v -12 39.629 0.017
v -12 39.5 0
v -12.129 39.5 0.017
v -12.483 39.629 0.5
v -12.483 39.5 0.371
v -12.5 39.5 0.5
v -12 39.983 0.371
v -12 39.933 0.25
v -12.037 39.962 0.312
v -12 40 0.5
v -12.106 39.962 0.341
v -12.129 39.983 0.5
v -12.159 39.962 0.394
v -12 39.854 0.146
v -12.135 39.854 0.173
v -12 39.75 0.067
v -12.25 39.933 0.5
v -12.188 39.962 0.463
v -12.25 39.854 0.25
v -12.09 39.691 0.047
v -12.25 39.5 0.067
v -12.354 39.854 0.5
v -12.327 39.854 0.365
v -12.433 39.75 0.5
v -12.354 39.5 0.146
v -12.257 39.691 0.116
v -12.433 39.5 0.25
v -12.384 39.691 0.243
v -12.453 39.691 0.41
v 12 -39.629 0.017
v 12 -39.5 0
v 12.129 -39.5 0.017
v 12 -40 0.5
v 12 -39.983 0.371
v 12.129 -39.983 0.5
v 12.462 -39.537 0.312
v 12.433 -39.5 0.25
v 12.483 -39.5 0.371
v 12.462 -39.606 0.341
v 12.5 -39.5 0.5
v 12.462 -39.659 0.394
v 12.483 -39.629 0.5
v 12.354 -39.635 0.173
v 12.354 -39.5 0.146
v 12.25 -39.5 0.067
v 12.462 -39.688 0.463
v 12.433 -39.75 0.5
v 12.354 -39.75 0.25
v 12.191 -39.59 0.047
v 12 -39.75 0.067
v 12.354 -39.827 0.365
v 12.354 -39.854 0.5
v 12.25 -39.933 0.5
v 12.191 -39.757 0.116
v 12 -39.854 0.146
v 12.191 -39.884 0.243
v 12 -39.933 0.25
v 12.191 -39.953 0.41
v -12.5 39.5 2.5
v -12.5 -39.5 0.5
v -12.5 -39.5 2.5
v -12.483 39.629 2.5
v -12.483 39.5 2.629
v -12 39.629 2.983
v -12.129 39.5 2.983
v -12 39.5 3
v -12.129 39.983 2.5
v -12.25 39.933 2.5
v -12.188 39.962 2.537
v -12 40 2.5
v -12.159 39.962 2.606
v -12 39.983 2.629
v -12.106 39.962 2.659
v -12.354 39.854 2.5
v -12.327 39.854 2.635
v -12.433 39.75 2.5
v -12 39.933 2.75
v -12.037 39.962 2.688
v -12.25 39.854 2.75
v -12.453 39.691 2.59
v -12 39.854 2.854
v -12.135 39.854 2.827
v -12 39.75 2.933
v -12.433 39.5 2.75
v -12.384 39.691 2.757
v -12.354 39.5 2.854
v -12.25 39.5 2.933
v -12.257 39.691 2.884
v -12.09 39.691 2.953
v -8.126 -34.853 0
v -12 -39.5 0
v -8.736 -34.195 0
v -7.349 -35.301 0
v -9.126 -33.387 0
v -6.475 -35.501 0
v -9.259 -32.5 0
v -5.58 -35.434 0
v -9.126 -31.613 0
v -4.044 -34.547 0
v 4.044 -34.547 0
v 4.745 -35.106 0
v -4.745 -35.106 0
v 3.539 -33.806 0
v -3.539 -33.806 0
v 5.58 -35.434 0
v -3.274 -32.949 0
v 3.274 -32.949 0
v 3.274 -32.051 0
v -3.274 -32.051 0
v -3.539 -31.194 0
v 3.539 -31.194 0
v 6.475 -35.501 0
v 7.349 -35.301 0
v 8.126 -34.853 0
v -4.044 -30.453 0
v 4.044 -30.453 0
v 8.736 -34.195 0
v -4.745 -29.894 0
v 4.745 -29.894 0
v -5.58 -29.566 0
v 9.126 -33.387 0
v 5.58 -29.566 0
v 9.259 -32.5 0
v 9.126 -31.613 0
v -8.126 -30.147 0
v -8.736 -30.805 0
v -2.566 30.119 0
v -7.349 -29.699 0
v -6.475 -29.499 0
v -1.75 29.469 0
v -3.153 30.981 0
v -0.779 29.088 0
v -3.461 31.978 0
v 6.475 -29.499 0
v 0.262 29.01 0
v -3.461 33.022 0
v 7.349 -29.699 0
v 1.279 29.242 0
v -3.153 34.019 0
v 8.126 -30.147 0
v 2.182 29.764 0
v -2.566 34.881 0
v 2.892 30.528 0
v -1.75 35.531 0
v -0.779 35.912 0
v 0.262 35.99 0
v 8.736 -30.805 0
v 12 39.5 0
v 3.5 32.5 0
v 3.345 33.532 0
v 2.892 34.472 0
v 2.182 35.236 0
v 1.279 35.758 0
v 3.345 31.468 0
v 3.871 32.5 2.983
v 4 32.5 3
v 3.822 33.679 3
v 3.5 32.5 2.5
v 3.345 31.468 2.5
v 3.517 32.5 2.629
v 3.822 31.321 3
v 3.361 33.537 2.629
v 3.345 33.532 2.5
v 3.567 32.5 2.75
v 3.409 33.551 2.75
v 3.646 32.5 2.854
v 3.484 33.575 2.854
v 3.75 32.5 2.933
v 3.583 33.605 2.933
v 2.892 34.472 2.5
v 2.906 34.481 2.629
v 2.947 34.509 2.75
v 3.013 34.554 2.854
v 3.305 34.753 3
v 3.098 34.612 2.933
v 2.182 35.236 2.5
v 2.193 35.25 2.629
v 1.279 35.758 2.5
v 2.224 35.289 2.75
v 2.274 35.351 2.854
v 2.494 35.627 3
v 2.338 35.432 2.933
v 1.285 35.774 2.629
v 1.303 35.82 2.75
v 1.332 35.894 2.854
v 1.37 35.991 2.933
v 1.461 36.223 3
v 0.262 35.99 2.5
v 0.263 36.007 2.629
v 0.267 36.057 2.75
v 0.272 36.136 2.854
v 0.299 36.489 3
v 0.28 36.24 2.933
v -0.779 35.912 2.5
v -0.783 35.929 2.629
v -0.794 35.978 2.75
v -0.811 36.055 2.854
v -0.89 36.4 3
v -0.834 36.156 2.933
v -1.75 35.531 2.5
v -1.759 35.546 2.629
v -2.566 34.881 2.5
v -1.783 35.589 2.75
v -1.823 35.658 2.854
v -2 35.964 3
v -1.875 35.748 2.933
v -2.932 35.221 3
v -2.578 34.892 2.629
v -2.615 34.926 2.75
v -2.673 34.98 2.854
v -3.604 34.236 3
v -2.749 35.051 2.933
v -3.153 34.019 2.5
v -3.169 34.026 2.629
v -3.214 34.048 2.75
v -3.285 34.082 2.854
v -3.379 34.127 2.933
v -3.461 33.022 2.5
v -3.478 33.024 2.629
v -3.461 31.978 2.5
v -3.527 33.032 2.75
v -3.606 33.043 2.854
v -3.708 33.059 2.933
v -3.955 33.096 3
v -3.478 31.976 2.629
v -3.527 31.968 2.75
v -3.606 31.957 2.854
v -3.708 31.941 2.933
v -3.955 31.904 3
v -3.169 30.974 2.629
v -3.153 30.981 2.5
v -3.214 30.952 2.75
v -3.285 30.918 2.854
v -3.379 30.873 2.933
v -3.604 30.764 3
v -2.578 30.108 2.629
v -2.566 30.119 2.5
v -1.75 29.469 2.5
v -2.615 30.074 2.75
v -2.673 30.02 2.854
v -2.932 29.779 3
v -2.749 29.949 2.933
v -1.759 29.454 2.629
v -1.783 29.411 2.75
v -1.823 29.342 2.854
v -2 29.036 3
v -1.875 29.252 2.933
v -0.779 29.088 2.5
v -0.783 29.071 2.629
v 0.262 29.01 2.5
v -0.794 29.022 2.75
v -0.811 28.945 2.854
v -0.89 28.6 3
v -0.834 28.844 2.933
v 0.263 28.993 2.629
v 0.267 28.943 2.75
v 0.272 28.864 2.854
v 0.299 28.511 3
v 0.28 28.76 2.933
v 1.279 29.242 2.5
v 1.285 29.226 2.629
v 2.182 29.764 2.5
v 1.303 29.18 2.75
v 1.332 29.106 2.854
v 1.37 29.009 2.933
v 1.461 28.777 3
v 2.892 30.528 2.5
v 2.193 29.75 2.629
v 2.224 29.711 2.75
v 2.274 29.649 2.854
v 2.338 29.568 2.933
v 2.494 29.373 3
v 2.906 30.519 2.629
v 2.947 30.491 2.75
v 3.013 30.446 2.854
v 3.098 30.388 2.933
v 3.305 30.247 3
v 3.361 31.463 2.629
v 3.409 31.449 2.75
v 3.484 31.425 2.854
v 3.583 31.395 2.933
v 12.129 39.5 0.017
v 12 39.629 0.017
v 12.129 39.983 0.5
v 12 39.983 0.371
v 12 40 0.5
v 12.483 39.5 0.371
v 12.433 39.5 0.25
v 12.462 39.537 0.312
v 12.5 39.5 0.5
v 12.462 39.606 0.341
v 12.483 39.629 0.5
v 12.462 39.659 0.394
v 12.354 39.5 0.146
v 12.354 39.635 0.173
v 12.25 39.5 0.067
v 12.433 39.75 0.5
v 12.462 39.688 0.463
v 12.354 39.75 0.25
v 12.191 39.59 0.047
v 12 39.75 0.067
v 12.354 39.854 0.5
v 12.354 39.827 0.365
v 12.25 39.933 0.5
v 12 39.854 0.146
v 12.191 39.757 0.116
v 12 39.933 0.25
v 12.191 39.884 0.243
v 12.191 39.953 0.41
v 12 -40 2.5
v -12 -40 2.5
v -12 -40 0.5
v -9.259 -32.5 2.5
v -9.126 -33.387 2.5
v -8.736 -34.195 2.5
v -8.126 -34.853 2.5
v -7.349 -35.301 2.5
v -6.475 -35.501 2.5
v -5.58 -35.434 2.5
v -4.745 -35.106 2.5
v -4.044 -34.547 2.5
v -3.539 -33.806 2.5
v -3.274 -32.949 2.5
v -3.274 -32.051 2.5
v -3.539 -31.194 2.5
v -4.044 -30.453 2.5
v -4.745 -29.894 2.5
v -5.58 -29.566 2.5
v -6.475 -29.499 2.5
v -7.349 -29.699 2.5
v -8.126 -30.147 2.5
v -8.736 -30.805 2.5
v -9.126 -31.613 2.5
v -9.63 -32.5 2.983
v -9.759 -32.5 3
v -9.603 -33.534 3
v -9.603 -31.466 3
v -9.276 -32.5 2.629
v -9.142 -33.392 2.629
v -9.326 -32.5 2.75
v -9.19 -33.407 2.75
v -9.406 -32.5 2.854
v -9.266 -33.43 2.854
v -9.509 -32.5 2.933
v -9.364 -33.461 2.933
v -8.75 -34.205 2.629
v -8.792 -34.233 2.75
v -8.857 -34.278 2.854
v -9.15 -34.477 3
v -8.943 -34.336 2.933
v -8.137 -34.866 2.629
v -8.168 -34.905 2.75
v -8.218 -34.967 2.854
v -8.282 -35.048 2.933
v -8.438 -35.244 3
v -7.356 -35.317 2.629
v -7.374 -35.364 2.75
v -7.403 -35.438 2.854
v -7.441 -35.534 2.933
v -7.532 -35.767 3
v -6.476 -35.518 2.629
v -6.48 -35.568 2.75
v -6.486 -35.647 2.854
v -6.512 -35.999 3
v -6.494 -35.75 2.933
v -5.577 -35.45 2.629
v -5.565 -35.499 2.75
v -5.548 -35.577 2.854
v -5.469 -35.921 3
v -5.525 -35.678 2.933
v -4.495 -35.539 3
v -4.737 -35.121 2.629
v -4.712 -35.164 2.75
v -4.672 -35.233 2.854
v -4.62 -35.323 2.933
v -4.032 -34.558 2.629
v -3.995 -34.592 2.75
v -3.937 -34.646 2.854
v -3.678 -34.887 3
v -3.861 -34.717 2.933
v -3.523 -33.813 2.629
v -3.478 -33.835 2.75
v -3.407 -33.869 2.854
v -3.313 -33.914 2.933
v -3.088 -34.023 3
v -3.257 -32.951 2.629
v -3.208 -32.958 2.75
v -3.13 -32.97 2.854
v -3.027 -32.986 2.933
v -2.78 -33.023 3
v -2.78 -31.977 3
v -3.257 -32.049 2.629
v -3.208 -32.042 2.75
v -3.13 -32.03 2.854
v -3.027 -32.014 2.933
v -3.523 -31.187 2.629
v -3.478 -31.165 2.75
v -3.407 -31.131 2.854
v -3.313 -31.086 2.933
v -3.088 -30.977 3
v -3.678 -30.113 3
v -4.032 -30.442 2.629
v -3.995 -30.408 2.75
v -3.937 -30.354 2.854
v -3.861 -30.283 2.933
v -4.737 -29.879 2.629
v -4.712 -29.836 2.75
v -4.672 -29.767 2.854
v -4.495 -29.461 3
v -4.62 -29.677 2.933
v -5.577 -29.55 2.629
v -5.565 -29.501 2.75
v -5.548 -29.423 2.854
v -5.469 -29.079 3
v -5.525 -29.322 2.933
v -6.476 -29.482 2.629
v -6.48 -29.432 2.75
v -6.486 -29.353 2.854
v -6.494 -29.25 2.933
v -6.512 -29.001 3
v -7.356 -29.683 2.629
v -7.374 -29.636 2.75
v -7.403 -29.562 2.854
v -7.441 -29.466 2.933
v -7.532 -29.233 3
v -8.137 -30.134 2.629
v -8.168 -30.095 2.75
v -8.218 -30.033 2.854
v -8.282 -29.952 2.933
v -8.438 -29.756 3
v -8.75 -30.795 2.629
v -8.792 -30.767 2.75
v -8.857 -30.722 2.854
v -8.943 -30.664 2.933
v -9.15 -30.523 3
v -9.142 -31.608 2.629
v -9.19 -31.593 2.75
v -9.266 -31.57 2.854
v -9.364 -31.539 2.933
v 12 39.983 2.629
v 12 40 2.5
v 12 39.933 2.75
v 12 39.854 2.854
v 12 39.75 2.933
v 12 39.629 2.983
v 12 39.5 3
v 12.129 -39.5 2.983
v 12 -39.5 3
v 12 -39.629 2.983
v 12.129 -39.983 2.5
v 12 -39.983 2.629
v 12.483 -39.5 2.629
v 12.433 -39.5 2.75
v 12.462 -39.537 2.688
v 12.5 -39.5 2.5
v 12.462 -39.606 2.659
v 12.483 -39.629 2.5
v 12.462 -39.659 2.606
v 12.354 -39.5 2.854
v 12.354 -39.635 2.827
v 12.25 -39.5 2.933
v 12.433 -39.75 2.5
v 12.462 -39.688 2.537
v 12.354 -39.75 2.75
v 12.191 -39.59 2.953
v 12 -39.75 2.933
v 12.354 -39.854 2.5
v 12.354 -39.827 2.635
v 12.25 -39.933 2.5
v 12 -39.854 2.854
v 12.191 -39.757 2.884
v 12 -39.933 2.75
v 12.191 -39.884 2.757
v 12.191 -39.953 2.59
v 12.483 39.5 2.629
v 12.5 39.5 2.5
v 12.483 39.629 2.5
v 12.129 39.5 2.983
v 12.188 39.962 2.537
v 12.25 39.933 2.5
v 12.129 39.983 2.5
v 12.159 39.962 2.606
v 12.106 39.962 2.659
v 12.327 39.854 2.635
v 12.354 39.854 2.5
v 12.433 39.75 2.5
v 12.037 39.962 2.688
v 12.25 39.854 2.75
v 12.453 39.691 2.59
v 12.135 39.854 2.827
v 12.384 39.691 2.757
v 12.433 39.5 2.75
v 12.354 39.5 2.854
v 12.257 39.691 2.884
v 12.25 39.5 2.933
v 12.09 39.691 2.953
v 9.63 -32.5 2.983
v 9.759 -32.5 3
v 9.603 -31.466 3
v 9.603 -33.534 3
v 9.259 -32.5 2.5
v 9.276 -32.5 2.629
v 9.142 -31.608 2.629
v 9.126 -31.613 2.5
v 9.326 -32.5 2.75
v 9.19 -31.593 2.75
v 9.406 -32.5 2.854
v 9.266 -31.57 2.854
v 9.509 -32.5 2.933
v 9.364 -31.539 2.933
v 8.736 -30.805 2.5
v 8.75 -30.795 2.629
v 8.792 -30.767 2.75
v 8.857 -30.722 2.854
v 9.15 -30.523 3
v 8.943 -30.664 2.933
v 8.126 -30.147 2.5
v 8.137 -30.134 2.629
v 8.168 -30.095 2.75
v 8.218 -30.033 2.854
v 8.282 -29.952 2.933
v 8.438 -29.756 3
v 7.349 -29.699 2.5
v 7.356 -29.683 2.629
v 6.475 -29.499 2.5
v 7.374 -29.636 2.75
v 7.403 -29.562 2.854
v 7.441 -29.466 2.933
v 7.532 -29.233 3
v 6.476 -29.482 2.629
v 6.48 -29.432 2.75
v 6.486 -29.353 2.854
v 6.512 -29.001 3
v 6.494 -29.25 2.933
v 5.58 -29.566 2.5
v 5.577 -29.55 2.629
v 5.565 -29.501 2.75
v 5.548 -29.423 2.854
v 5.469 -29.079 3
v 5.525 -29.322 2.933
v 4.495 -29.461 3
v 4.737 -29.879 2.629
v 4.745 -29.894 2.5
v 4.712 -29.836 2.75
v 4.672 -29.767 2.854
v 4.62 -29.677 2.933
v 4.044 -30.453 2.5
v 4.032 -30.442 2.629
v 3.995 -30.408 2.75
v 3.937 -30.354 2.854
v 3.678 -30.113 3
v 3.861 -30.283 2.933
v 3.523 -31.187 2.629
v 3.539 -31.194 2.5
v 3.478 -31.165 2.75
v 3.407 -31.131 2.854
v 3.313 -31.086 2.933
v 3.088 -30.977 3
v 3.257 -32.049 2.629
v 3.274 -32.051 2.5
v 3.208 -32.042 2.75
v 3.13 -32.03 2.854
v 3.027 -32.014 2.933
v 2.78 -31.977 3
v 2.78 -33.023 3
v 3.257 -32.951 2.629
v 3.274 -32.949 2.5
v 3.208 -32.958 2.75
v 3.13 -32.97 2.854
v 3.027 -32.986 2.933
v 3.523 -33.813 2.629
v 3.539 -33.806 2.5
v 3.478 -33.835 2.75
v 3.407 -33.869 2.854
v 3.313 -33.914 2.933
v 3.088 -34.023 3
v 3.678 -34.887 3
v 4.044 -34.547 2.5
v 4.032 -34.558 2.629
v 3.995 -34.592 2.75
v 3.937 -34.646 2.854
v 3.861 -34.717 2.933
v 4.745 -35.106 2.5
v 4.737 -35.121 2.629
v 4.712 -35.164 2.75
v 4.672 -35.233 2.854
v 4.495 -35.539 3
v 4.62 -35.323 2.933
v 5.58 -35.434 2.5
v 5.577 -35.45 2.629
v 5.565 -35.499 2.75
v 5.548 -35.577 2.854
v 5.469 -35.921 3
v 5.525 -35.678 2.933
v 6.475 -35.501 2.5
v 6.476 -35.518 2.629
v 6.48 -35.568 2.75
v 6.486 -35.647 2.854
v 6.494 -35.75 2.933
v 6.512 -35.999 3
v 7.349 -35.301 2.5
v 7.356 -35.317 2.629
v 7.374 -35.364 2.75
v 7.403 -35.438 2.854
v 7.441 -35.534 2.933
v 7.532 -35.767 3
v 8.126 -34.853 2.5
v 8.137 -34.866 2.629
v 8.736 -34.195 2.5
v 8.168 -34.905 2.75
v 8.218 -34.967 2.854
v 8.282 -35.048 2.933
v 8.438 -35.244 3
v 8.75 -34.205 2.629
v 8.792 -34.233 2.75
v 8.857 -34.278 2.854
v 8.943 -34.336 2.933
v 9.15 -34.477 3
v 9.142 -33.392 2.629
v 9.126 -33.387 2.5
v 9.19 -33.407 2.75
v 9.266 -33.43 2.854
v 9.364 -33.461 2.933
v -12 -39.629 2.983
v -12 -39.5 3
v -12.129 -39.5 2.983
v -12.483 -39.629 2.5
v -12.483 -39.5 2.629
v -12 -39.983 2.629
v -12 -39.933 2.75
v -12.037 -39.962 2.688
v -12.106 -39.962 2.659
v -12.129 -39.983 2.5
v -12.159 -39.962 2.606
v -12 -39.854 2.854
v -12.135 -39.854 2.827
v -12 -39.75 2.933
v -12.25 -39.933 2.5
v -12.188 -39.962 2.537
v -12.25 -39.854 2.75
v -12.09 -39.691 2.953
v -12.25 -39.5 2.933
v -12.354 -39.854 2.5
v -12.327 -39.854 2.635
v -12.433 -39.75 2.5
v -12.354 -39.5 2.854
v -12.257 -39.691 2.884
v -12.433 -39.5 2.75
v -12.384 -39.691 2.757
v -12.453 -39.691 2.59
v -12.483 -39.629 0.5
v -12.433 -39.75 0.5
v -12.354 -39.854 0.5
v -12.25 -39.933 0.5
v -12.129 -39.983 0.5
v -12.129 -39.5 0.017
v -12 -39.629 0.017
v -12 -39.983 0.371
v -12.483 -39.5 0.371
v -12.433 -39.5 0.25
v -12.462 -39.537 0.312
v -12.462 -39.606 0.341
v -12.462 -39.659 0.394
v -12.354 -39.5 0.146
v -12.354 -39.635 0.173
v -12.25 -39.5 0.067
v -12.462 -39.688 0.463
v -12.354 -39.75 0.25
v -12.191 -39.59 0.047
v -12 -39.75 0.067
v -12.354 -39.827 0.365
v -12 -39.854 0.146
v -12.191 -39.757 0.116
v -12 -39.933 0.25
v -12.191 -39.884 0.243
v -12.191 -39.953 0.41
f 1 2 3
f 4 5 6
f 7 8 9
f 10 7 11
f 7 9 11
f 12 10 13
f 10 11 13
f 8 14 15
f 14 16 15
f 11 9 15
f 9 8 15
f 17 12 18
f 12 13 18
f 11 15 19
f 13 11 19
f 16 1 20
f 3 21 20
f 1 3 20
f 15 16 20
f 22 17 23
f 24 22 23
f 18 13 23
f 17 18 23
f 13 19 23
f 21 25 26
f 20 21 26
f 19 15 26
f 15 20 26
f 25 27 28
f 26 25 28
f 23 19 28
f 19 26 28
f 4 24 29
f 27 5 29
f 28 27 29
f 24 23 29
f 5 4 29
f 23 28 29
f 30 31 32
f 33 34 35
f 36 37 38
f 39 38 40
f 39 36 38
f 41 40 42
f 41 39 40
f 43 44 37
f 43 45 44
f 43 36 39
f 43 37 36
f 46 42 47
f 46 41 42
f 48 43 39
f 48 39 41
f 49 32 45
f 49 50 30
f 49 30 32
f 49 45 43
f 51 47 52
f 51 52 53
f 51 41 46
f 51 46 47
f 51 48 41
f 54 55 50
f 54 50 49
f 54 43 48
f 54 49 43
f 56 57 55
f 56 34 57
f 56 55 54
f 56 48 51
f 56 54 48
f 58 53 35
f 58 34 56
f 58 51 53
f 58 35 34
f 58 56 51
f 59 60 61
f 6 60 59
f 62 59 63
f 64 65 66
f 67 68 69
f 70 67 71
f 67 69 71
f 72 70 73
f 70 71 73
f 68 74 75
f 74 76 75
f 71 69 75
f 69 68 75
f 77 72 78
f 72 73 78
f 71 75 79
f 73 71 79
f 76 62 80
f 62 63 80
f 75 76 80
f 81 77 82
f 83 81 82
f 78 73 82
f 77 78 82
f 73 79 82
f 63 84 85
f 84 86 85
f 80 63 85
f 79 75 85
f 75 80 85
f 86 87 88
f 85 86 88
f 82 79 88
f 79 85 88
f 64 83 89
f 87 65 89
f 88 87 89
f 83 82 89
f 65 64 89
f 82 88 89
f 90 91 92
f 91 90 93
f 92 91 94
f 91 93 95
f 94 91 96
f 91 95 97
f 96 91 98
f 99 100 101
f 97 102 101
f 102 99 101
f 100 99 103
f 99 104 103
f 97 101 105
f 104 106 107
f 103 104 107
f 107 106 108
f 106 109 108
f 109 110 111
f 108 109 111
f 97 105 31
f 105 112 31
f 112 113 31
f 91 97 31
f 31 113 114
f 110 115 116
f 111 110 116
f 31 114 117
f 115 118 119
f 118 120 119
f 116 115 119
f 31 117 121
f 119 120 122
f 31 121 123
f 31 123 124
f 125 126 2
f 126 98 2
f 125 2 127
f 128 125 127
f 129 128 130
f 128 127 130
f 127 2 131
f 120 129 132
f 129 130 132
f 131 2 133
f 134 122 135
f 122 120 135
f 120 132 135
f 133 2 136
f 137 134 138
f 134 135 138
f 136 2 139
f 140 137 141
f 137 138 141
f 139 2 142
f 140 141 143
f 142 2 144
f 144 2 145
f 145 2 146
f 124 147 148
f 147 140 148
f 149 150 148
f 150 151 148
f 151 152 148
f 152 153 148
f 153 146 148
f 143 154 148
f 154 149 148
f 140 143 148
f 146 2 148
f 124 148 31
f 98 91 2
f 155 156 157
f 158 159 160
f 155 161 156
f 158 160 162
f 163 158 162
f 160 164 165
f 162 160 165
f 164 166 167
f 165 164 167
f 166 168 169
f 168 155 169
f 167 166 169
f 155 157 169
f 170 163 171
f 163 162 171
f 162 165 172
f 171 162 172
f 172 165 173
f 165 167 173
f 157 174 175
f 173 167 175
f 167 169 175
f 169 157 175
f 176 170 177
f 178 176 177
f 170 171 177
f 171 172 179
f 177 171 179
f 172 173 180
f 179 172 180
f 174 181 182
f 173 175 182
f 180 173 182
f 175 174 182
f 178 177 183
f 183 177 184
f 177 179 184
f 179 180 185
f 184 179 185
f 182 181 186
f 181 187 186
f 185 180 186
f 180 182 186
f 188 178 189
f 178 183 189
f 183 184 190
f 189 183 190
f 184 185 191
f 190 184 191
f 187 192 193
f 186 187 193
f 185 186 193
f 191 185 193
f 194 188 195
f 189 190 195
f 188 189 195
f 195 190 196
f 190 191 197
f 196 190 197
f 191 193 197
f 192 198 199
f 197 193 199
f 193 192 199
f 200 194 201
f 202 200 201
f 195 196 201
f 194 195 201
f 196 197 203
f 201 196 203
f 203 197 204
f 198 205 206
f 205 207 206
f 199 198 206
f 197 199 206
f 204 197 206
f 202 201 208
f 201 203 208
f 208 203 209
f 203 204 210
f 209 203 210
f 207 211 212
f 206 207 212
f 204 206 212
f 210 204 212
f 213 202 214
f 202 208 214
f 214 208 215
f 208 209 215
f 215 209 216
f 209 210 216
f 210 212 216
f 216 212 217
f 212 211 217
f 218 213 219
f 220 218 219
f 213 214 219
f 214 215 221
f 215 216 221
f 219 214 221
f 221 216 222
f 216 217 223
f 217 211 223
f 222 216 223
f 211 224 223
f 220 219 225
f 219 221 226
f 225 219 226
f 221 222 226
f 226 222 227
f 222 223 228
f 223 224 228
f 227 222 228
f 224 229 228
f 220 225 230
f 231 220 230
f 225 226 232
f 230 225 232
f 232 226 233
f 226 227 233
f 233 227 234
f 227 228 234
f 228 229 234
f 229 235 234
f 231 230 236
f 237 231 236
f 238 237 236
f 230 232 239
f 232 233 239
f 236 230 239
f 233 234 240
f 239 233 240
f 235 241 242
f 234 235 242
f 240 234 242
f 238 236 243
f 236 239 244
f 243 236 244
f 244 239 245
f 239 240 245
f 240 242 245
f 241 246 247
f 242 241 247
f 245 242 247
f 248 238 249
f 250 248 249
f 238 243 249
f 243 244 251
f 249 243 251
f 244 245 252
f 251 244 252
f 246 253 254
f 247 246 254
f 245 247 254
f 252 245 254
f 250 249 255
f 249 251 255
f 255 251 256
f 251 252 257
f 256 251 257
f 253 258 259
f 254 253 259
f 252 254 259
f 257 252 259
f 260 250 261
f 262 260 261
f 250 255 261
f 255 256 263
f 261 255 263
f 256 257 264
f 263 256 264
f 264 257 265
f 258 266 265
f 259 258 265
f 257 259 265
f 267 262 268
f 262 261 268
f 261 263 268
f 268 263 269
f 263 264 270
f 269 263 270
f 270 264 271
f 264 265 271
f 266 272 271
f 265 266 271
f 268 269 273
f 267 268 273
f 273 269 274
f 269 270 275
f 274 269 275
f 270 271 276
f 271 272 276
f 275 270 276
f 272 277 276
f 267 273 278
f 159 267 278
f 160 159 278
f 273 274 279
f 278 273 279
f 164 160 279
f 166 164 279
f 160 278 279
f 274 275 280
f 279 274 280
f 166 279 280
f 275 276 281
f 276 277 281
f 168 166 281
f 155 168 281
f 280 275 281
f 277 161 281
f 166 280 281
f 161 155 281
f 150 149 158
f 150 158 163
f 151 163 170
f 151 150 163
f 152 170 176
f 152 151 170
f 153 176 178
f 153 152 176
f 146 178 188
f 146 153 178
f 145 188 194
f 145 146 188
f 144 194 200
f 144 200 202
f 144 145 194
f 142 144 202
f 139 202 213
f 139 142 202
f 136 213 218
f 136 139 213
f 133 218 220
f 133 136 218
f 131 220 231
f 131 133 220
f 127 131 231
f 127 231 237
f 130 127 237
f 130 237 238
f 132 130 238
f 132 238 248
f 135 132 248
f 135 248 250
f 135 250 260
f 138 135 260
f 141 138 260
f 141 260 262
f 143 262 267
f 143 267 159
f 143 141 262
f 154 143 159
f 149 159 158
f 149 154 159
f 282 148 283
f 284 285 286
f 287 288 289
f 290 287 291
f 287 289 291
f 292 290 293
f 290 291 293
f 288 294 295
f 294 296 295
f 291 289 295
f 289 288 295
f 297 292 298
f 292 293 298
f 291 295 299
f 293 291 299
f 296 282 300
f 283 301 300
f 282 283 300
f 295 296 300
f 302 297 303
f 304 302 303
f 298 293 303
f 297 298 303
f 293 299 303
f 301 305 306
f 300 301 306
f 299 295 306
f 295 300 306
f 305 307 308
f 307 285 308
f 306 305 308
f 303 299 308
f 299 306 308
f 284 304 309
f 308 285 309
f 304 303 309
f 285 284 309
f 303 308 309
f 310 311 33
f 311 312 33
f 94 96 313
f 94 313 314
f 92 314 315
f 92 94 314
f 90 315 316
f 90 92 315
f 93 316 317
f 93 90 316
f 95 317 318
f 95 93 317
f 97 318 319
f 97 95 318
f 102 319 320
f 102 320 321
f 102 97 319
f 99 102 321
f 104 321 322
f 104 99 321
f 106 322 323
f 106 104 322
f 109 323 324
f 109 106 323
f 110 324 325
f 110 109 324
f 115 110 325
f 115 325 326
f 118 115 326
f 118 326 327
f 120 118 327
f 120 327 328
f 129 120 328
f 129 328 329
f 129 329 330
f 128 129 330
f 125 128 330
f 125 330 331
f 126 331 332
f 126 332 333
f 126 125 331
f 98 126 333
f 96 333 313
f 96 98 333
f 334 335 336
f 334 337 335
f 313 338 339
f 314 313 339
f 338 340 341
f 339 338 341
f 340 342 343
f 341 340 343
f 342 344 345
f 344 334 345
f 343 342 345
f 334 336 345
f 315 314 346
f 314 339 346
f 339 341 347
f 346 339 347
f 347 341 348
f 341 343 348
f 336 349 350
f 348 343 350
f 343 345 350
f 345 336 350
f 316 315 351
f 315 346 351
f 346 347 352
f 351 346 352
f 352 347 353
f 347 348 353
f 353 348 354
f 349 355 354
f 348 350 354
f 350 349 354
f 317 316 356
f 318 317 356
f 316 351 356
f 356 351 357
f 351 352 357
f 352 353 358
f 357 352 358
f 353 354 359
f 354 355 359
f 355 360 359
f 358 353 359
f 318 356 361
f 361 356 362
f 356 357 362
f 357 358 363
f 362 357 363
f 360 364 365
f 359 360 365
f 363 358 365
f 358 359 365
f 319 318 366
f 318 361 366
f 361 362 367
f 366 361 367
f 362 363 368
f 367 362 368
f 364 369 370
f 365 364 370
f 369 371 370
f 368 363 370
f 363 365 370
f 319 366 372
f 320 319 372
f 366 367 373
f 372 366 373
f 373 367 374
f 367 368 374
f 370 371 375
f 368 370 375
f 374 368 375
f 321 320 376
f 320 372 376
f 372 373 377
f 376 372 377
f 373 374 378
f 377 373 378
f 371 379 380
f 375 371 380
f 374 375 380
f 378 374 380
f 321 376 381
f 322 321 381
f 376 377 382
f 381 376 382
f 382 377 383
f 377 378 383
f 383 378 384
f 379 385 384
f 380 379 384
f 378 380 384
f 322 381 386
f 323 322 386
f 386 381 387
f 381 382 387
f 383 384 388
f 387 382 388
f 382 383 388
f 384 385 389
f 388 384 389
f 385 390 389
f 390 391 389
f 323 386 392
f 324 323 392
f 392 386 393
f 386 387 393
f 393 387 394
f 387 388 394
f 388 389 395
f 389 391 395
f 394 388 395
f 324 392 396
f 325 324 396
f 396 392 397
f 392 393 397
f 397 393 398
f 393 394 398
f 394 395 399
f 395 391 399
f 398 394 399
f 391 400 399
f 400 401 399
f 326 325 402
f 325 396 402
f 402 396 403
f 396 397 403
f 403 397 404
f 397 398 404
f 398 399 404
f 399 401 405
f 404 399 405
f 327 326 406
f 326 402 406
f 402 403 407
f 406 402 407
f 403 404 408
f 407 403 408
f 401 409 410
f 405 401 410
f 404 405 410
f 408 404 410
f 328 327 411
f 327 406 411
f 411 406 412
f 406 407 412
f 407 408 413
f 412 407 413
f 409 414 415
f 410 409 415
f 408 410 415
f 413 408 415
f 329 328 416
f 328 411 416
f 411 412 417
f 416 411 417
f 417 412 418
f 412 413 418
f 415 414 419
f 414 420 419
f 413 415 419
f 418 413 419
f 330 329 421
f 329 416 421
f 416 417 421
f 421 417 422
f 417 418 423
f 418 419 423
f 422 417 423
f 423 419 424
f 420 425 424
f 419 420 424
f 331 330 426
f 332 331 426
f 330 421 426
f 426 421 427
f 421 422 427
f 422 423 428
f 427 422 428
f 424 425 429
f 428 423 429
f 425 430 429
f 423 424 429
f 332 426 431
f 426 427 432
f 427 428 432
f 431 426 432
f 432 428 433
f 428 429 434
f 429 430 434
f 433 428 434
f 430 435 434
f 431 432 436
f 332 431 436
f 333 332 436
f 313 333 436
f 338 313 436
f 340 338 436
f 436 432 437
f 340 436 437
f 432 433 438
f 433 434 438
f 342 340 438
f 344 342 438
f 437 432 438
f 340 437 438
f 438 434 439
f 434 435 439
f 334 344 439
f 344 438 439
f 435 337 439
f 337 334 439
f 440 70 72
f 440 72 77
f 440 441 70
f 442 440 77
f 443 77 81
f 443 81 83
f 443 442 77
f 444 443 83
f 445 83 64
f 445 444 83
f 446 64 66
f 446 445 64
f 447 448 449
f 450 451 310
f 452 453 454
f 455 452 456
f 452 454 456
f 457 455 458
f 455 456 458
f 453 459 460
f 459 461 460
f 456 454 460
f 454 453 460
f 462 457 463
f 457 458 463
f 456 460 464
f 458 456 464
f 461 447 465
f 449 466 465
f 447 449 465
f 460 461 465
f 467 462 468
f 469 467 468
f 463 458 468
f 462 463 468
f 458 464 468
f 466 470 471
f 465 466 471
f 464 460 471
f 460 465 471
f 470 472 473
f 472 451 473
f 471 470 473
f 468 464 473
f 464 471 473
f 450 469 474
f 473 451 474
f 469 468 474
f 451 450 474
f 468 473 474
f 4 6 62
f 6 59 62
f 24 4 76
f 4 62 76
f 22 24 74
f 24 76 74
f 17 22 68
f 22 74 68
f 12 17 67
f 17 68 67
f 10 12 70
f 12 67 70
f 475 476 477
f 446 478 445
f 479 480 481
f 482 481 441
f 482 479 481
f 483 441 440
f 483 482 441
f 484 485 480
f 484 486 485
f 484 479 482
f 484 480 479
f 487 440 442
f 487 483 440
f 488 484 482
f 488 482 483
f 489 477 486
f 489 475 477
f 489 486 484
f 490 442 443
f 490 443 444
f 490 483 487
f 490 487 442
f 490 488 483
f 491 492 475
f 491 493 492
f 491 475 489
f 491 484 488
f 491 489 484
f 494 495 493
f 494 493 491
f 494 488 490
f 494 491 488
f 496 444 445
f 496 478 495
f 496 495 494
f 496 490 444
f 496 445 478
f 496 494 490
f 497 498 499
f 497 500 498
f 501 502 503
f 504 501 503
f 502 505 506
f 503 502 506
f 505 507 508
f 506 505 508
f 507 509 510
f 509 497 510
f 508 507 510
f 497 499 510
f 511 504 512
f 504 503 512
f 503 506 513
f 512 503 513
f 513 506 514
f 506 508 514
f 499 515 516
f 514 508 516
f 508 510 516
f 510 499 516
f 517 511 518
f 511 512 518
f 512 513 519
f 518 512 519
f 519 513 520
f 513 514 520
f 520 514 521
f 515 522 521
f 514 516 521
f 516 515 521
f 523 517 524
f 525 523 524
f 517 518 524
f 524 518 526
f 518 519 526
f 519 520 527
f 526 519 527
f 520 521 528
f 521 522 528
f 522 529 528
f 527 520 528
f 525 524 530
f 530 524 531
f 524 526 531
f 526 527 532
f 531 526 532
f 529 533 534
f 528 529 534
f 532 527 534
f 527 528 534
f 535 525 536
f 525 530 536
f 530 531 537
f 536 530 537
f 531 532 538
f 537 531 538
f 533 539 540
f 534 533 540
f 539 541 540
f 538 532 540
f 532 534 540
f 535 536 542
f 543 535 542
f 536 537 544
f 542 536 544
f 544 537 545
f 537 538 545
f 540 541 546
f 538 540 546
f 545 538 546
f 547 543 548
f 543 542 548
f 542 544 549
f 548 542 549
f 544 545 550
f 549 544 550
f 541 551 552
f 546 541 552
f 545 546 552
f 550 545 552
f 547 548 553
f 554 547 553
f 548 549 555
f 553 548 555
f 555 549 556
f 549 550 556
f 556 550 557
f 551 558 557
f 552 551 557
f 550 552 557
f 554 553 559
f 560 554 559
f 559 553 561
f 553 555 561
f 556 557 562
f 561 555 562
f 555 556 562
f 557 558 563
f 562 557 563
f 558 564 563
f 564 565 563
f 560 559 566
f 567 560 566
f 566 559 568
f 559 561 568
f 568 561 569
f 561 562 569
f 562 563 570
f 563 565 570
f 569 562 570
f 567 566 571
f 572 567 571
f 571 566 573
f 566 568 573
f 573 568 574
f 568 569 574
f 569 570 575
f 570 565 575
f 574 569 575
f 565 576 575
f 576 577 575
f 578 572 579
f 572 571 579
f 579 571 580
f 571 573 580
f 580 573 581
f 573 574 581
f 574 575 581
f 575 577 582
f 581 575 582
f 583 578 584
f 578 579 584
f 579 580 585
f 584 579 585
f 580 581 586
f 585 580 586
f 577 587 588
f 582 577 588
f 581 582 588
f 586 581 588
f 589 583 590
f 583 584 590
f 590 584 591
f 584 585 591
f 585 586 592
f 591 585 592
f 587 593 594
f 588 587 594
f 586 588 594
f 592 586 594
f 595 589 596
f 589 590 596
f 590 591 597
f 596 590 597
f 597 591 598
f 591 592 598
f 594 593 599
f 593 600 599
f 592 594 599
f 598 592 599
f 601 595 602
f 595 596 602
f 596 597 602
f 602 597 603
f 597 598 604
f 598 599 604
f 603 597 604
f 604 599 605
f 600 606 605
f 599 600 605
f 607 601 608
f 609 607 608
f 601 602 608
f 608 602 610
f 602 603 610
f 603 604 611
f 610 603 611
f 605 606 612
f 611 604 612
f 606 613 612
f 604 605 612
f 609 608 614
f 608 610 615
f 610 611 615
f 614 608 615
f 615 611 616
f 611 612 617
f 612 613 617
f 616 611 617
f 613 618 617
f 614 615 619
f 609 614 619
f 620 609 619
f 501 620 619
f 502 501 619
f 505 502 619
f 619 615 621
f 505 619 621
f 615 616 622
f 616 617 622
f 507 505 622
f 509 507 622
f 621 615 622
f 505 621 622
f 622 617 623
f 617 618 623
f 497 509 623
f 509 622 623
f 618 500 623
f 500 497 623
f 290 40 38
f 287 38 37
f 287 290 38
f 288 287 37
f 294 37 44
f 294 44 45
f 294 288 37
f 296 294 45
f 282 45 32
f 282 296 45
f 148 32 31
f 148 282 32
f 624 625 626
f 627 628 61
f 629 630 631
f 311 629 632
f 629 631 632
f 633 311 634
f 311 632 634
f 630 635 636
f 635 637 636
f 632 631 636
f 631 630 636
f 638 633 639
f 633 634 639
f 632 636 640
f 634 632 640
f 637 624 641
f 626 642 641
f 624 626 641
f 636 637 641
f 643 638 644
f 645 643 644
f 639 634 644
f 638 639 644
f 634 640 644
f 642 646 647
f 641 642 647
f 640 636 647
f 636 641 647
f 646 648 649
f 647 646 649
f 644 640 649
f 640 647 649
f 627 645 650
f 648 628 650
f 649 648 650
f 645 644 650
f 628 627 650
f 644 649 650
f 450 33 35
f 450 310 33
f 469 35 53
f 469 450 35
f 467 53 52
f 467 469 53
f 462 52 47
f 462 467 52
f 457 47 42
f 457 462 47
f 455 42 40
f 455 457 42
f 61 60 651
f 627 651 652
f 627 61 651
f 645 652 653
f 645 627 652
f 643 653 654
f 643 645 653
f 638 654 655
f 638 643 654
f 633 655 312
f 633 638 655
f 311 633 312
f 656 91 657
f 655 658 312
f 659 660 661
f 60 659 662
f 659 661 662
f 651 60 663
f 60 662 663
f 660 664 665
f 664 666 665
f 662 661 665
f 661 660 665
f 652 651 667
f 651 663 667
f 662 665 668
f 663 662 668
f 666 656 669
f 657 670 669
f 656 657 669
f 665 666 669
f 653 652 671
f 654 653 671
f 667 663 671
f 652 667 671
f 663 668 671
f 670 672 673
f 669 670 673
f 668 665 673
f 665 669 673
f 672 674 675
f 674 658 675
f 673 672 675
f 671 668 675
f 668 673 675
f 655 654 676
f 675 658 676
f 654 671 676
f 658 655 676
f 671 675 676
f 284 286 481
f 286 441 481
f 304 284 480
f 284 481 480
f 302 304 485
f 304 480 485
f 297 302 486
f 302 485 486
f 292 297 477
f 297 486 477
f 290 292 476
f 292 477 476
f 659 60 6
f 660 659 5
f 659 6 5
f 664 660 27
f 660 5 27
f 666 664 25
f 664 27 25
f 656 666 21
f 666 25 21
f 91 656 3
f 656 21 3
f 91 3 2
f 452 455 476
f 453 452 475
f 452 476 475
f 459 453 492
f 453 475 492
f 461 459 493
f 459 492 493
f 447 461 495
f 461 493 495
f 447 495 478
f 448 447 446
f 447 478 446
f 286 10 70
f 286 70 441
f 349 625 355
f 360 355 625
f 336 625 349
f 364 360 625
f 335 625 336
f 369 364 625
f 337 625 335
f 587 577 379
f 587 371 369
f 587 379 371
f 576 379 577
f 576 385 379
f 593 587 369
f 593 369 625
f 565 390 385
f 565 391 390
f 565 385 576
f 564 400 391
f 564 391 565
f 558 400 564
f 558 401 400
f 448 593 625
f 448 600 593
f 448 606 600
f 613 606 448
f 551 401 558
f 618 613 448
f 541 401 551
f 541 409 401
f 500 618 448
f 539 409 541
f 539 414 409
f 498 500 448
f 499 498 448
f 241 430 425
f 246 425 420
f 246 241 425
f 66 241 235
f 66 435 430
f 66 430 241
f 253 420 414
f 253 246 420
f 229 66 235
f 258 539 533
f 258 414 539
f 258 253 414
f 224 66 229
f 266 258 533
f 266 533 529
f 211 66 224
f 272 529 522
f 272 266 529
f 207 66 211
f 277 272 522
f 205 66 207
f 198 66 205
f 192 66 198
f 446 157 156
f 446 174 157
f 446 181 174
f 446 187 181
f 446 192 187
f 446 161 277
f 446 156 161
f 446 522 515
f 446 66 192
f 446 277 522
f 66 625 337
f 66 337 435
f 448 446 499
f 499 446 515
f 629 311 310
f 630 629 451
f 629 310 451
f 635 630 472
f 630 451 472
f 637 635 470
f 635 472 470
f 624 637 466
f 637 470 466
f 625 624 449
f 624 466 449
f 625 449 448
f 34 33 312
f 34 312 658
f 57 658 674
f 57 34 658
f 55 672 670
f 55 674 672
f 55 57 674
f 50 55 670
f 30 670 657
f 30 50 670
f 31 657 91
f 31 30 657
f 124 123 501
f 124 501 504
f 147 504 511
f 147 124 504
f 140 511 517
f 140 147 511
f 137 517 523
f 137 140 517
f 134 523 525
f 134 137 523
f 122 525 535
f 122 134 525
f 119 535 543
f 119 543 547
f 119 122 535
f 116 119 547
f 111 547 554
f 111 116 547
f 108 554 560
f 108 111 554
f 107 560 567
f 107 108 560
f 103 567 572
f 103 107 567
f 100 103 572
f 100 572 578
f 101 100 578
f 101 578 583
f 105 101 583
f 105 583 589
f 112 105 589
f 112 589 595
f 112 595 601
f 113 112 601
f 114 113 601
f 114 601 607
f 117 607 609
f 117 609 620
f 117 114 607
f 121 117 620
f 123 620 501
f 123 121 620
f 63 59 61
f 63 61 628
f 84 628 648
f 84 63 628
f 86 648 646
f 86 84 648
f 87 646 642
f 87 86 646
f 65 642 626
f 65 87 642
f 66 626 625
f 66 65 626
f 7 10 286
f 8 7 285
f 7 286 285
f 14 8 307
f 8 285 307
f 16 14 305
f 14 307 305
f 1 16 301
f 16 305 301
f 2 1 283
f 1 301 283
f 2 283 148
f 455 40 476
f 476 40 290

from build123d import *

# Parameters (mm, degrees)
CROQUIS1_W              = 25
CROQUIS1_H              = 80
CROQUIS1_R              = 3.5
CROQUIS1_R_2            = 3.009292022
SALIENTE_EXTRUIR1_DEPTH = 3
REDONDEO1_R             = 0.5


with BuildPart() as part:
    # Croquis1 → Saliente-Extruir1 (new body)
    with BuildSketch(Plane.XY):
        Rectangle(CROQUIS1_W, CROQUIS1_H)
        with Locations((0, 32.5)):
            Circle(CROQUIS1_R, mode=Mode.SUBTRACT)
        with Locations((6.25, -32.5)):
            Circle(CROQUIS1_R_2, mode=Mode.SUBTRACT)
        with Locations(Location((-6.25, -32.5, 0), (0, 0, 180))):
            Circle(CROQUIS1_R_2, mode=Mode.SUBTRACT)
    extrude(amount=SALIENTE_EXTRUIR1_DEPTH)

    # Redondeo1
    redondeo1_edges = [part.edges().sort_by_distance(p)[0] for p in [
        (-3.5, 32.5, 3),
        (-12.5, 0, 3),
        (3.240707978, -32.5, 3),
        (0, -40, 3),
        (-3.240707978, -32.5, 3),
        (12.5, 0, 3),
        (0, -40, 0),
        (-12.5, 0, 0),
        (0, 40, 0),
        (12.5, 0, 0),
        (12.5, -40, 1.5),
        (-12.5, -40, 1.5),
        (-12.5, 40, 1.5),
        (12.5, 40, 1.5),
        (0, 40, 3),
    ]]
    fillet(redondeo1_edges, radius=REDONDEO1_R)


solid = part.part
